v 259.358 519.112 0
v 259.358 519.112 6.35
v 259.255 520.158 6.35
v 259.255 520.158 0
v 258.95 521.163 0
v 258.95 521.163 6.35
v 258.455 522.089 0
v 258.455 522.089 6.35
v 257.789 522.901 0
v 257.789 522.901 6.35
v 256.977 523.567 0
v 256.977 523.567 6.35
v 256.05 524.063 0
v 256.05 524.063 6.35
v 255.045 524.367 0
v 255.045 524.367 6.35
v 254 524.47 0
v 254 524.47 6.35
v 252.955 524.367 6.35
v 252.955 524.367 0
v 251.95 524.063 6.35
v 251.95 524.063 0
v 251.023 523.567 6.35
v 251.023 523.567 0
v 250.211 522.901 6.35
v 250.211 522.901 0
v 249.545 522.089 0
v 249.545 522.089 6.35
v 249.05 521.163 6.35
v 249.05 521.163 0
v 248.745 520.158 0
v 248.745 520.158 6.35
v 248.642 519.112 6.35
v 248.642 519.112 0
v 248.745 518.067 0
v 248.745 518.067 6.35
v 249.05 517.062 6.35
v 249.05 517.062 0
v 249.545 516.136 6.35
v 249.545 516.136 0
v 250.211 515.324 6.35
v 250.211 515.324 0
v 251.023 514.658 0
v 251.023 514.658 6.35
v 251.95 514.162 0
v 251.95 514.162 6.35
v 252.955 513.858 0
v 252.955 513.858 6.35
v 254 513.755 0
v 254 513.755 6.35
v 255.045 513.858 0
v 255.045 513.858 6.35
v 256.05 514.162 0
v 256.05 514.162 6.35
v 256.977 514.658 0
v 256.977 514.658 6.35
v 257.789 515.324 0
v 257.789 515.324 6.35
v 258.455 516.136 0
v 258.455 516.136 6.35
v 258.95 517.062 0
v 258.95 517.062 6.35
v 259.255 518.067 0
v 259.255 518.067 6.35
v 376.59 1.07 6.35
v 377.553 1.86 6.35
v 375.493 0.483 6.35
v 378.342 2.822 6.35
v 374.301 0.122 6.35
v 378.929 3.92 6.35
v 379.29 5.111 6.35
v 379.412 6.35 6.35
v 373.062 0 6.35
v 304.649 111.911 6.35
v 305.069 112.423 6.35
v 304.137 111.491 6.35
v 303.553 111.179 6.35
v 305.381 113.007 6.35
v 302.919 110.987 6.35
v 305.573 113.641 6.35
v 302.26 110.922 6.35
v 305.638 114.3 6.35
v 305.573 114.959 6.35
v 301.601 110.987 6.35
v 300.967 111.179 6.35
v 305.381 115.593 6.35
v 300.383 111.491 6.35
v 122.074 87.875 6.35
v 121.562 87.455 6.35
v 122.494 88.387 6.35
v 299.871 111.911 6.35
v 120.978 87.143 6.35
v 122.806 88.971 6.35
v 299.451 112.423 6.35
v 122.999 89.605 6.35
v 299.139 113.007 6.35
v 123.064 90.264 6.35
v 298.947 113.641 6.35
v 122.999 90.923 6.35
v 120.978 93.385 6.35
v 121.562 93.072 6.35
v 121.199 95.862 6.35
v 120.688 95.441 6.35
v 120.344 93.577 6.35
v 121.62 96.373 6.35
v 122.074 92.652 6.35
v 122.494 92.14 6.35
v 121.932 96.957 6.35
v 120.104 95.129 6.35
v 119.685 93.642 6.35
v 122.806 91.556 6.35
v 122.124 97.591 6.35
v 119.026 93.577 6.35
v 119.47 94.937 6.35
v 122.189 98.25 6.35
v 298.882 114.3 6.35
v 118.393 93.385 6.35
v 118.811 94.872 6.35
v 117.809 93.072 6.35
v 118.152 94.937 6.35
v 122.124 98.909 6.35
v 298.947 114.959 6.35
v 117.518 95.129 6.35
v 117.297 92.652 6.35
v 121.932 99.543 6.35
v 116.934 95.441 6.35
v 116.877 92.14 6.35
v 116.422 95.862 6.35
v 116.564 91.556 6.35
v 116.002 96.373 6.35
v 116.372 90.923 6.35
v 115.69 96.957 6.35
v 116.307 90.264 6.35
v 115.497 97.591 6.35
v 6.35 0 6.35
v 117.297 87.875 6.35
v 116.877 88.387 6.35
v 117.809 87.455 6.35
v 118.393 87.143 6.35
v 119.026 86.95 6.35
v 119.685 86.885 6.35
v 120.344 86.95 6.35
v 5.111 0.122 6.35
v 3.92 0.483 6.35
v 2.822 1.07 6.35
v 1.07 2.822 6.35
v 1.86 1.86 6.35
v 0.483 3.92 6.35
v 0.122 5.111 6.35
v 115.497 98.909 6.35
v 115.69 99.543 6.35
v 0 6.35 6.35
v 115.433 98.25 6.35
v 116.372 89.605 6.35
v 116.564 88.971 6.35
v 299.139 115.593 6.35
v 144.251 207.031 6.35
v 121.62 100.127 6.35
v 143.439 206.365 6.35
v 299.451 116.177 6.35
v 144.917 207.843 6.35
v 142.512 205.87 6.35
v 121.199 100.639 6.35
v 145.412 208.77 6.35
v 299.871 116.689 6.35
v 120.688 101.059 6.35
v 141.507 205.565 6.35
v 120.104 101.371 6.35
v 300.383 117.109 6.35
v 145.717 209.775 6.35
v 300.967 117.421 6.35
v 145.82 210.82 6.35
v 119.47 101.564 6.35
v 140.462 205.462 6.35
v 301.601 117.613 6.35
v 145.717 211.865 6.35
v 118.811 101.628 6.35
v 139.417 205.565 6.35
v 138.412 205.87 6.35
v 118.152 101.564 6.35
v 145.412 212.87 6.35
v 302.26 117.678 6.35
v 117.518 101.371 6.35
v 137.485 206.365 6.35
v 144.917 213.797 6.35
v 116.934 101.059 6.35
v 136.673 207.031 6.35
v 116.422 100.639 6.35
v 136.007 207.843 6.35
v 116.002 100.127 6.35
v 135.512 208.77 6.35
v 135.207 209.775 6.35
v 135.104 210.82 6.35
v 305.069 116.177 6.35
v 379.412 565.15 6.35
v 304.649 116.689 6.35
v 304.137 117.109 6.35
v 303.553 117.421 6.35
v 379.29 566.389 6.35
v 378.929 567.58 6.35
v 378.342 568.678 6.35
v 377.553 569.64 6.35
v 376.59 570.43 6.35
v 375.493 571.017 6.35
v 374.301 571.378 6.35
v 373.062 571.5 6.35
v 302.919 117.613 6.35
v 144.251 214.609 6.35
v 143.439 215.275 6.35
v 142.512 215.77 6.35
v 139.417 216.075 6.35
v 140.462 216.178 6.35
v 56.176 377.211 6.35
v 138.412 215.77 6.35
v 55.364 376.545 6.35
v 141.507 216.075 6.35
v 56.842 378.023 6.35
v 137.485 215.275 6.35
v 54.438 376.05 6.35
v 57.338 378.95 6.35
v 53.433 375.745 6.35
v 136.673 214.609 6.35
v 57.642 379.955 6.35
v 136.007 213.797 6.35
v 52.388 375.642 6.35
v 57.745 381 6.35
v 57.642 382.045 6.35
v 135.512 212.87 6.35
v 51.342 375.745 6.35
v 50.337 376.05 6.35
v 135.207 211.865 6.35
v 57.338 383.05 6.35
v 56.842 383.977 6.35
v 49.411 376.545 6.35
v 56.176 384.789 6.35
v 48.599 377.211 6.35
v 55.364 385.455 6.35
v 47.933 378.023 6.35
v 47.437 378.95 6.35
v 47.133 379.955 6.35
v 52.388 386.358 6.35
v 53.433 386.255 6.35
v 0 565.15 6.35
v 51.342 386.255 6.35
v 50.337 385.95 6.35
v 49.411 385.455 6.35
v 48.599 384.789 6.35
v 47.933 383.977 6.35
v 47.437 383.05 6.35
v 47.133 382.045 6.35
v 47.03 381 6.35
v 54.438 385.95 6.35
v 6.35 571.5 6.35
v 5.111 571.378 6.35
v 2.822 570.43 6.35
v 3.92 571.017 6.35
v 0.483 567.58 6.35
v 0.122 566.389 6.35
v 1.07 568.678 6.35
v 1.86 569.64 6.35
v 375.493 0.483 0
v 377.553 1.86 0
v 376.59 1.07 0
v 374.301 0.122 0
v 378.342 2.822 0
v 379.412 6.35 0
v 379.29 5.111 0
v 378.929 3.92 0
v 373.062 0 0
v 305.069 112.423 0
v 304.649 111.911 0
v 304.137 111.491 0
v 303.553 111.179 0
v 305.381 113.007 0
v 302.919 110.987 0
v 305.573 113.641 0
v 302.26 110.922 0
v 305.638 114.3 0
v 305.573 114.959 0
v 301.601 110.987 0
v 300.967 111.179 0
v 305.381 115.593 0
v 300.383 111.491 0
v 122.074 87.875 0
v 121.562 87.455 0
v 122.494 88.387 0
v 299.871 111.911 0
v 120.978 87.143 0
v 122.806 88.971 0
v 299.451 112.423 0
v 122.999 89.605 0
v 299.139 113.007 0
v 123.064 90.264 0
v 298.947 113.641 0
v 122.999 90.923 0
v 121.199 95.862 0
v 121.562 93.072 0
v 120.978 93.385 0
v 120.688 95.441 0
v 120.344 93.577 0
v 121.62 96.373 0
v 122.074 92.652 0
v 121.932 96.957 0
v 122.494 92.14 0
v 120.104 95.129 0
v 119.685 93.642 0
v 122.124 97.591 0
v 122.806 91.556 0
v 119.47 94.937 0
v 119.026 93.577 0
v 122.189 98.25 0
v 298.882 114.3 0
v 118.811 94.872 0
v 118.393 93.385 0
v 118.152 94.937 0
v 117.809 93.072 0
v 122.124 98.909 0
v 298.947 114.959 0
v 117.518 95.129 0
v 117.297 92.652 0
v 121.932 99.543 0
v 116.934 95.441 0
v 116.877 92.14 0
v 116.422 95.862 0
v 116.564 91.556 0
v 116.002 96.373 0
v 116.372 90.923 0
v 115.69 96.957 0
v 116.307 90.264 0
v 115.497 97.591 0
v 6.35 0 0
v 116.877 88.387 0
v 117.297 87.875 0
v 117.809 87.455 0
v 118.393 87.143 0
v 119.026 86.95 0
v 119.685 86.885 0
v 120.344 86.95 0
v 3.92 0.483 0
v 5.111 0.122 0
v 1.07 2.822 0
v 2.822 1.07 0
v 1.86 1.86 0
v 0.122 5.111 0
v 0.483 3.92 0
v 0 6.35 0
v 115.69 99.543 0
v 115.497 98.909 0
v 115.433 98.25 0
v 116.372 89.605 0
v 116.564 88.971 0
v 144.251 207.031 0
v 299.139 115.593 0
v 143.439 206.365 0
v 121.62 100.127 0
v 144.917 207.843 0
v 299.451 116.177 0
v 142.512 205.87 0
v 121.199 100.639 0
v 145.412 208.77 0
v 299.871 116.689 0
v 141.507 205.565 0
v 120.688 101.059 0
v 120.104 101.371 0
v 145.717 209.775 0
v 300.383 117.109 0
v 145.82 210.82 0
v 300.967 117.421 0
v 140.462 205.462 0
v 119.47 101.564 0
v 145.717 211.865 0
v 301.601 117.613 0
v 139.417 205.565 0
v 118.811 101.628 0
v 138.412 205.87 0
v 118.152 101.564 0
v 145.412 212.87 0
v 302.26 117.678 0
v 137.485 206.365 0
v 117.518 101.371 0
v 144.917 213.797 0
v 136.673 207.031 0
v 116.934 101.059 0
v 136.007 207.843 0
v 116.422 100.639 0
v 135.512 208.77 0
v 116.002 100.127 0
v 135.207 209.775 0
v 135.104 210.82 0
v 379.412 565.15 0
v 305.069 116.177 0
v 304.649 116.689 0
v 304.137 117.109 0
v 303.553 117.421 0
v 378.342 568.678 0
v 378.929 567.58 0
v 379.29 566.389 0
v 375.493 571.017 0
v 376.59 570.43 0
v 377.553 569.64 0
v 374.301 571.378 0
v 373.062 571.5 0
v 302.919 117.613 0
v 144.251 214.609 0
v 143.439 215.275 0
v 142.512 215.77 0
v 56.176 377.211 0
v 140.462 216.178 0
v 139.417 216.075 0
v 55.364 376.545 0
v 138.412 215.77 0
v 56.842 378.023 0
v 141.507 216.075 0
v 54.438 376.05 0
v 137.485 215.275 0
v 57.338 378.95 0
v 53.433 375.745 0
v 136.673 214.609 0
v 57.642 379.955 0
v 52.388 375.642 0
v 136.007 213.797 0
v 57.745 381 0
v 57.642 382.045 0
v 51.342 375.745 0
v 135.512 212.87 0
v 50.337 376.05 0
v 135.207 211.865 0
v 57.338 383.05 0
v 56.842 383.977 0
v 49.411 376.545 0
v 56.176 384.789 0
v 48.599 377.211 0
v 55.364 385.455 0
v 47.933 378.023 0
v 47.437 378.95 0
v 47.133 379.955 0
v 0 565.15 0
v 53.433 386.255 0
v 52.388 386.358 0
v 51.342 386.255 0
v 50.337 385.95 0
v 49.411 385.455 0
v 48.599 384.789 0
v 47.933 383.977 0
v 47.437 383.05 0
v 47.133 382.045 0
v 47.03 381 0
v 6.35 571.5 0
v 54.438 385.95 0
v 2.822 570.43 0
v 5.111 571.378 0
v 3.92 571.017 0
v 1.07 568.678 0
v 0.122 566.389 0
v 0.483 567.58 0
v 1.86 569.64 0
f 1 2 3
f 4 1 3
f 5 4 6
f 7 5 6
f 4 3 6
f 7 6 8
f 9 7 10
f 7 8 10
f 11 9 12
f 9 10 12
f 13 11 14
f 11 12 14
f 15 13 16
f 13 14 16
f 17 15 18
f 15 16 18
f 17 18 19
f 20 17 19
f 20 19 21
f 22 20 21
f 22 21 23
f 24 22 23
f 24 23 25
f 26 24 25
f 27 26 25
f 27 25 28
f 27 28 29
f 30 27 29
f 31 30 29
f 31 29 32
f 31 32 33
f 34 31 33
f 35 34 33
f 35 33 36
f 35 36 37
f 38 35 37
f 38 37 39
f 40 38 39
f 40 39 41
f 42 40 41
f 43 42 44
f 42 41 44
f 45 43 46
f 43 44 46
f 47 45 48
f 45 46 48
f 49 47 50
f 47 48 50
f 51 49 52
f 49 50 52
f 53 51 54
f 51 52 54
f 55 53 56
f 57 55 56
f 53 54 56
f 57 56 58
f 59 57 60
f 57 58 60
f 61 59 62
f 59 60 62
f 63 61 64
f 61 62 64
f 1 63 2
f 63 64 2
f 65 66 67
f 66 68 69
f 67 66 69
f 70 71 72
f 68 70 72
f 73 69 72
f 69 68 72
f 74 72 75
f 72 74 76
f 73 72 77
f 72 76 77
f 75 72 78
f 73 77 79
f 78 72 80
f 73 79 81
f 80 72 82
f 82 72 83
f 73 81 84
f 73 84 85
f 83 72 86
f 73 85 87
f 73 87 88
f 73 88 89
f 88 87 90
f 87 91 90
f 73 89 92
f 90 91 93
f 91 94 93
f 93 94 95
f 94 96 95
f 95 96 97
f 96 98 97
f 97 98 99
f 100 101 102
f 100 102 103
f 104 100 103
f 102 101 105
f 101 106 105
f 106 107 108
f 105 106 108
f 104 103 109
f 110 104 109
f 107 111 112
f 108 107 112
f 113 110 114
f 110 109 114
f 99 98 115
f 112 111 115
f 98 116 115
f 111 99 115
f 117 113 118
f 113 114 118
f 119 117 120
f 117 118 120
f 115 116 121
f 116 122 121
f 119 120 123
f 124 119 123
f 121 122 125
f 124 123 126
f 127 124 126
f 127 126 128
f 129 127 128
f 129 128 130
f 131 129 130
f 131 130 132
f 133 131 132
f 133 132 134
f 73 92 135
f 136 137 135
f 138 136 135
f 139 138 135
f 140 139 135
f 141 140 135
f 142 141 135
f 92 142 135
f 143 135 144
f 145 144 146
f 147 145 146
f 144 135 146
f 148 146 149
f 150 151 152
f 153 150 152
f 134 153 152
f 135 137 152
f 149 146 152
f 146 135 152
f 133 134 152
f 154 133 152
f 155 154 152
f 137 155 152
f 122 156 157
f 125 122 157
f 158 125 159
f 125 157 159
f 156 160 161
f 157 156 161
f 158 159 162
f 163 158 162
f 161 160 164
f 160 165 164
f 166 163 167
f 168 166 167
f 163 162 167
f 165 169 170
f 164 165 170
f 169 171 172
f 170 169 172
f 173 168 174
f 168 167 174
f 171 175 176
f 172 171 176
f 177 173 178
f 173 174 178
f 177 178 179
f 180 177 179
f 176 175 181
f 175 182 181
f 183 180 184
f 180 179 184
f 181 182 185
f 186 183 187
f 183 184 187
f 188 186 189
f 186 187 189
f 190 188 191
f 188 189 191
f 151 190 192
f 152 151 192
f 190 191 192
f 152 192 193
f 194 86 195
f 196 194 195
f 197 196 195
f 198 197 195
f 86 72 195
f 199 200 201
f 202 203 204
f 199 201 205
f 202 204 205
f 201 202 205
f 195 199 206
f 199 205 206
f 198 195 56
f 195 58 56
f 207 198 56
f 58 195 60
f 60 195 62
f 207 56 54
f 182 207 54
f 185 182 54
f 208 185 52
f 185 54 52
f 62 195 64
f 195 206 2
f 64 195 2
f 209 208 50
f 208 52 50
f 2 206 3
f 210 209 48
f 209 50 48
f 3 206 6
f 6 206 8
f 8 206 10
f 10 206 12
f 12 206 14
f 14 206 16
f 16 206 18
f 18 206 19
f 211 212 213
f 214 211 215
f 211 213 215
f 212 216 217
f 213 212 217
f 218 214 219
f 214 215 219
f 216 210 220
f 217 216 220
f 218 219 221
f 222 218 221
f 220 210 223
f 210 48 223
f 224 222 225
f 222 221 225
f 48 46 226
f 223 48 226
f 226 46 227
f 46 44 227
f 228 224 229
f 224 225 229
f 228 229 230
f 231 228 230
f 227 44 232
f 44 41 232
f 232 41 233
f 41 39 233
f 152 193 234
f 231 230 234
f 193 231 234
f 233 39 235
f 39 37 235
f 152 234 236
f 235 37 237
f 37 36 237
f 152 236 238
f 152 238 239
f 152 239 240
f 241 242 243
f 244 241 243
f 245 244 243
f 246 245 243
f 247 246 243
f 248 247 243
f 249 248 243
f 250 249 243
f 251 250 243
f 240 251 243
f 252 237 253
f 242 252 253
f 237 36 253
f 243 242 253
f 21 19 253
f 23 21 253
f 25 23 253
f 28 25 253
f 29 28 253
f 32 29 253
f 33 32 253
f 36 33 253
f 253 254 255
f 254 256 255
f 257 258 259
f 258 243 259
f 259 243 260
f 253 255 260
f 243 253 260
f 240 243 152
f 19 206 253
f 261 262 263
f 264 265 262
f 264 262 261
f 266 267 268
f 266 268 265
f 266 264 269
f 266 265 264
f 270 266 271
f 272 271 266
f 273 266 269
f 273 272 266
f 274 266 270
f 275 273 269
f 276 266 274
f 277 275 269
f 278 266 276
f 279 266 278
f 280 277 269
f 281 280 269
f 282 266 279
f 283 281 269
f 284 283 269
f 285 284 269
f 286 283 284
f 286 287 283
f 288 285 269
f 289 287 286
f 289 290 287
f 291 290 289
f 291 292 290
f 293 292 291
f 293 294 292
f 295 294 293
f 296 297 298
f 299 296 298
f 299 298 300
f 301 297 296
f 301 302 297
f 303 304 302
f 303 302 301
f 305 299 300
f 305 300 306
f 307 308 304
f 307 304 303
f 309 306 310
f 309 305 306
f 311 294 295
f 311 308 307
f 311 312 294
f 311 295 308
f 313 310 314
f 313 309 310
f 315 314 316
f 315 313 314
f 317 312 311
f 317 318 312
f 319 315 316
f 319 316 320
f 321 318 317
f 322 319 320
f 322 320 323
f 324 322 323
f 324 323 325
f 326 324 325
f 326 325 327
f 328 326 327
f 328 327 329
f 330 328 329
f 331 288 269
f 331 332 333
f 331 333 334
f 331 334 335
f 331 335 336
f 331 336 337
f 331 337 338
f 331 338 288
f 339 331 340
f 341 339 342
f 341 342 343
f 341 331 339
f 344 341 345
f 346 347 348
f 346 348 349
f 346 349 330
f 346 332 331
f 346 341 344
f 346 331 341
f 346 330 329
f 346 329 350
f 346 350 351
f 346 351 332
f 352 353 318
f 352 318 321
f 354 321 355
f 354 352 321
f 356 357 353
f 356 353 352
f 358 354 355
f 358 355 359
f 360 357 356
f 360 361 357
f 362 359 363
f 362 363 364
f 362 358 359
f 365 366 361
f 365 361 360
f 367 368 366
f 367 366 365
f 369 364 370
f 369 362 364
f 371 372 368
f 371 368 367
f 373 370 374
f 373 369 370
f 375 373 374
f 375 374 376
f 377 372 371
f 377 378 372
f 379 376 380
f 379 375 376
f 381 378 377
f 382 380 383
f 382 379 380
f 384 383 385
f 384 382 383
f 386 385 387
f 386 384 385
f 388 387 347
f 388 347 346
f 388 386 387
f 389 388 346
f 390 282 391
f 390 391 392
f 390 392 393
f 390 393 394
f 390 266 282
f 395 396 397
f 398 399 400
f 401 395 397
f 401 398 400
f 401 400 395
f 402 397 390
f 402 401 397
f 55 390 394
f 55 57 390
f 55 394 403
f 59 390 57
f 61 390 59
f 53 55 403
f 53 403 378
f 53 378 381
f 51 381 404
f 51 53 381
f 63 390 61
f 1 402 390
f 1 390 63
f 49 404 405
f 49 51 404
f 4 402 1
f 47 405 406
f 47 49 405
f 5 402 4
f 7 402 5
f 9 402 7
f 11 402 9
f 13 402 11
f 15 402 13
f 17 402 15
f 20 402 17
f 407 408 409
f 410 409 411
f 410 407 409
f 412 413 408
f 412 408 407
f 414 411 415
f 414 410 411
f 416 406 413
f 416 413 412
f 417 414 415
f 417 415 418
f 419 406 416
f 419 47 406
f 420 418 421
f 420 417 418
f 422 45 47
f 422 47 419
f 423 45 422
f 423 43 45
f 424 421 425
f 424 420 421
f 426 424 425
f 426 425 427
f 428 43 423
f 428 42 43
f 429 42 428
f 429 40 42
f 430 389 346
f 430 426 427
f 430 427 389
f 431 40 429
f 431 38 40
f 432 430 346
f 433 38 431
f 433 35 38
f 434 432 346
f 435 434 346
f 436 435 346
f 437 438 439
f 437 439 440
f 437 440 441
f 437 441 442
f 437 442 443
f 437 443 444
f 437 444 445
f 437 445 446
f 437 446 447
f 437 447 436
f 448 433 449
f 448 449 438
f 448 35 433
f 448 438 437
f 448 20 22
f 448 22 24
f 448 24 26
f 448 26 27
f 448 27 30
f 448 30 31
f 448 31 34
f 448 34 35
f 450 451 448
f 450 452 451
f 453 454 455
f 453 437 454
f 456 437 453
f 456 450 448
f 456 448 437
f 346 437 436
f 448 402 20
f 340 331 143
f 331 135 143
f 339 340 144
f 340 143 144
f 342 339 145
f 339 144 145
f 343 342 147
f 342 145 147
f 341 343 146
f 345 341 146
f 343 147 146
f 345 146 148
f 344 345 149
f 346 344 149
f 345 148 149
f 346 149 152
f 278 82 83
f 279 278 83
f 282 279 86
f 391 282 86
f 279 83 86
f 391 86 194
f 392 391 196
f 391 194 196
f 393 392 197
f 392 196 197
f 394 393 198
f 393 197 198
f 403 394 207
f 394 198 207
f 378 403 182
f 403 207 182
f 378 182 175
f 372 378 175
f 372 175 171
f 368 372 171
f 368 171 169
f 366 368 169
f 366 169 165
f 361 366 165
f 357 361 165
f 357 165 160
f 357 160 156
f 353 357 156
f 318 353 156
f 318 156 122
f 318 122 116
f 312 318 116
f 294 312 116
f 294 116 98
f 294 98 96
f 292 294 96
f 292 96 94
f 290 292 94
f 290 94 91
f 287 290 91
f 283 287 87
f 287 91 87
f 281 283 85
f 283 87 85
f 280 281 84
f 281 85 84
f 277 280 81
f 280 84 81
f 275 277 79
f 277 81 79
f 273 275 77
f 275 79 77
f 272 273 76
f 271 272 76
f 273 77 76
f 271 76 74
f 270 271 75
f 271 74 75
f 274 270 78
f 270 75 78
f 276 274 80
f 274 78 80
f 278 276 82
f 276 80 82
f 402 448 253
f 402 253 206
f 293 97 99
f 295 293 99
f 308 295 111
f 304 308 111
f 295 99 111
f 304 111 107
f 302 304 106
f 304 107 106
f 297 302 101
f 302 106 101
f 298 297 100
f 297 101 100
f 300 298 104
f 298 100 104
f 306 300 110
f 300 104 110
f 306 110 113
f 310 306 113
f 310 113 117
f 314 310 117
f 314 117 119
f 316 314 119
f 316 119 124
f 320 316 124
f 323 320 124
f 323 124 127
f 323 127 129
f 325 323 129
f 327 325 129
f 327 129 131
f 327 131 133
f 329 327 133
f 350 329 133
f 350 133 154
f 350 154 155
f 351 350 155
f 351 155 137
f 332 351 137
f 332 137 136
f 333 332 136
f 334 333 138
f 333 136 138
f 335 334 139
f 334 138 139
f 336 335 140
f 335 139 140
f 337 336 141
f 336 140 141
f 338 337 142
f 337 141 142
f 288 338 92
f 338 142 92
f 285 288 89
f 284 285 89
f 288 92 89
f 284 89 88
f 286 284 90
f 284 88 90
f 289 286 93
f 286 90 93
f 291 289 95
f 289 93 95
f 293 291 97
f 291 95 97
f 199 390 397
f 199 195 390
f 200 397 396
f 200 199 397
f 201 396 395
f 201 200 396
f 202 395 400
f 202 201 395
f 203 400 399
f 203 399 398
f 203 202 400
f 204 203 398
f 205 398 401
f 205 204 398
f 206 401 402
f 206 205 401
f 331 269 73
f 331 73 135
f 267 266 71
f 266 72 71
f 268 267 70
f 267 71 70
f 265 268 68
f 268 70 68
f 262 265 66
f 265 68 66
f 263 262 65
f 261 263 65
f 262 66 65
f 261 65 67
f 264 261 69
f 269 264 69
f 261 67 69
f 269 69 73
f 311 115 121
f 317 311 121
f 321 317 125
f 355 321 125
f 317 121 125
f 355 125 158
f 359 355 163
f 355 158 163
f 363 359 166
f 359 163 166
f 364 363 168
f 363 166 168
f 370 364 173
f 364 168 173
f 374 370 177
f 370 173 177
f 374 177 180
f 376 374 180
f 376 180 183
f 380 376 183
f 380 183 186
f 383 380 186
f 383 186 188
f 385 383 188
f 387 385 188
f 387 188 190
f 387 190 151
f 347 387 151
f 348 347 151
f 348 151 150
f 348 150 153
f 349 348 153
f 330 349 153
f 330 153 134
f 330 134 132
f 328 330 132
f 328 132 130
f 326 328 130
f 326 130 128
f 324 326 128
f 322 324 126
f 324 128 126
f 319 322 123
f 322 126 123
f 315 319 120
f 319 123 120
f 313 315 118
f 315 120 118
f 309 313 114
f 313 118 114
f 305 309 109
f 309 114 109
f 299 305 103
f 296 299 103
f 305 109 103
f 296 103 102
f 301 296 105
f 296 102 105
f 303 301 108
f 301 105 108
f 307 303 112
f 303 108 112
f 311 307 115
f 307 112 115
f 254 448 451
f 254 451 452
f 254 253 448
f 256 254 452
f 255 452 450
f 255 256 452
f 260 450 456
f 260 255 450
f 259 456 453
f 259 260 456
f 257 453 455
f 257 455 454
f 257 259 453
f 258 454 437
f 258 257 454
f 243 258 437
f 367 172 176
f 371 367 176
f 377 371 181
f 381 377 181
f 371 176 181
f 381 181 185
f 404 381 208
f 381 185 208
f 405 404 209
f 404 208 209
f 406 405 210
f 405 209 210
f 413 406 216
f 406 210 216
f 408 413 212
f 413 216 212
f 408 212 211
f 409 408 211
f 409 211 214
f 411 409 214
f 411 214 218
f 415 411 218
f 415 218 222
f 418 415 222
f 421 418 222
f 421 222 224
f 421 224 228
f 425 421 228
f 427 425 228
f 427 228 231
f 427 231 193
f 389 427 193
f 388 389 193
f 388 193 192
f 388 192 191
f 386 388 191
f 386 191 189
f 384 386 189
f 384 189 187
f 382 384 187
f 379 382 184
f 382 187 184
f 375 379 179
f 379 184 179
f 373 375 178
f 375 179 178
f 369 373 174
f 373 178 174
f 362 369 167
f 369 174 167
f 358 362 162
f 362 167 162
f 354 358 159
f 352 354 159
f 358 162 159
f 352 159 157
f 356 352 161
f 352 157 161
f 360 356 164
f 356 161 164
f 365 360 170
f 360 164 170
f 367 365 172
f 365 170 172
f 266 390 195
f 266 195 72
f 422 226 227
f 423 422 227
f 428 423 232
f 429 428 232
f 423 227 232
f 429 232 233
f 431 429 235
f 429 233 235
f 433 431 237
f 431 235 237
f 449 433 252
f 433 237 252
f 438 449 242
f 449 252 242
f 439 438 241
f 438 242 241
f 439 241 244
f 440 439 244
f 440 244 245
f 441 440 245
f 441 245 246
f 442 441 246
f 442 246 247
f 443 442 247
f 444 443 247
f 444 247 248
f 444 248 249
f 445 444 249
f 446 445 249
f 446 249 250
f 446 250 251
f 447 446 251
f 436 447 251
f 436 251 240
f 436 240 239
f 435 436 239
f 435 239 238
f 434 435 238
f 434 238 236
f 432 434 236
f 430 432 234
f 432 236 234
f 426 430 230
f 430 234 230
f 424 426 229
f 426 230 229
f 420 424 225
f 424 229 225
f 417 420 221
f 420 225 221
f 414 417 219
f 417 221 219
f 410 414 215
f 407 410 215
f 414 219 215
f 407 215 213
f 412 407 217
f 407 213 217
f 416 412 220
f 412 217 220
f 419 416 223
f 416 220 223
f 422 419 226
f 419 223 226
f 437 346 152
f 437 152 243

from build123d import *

# Parameters (mm, degrees)
BOSS_EXTRUDE1_DEPTH              = 6.35
FILLET1_R                        = 3.175
FILLET2_R                        = 44.45
F_1_4_CLEARANCE_HOLE1_D          = 6.7564
SKETCH4_W                        = 100.0125
SKETCH4_H                        = 155.575
CUT_EXTRUDE1_DEPTH               = 746.989881382
F_27_64_0_42188_DIAMETER_HOLE1_D = 10.715752
FILLET3_R                        = 6.35


with BuildPart() as part:
    # Sketch1 → Boss-Extrude1 (new body)
    with BuildSketch(Plane.XY):
        Polygon((0, 0), (0, 571.5), (379.4125, 571.5), (379.4125, 466.725), (479.425, 466.725), (479.425, 355.6), (428.625, 355.6), (428.625, 403.225), (379.4125, 403.225), (379.4125, 0), align=None)
    extrude(amount=BOSS_EXTRUDE1_DEPTH)

    # Fillet1
    fillet1_edges = [part.edges().sort_by_distance(p)[0] for p in [
        (428.625, 403.225, 3.175),
        (379.4125, 403.225, 3.175),
    ]]
    fillet(fillet1_edges, radius=FILLET1_R)

    # Fillet2
    fillet2_edges = [part.edges().sort_by_distance(p)[0] for p in [
        (379.4125, 466.725, 3.175),
        (479.425, 466.725, 3.175),
    ]]
    fillet(fillet2_edges, radius=FILLET2_R)

    # 1/4 Clearance Hole1 (through all)
    with Locations(Plane(origin=(0, 0, 0), x_dir=(-1, 0, 0), z_dir=(0, 0, -1))):
        with Locations((-118.810746346, 98.250269973), (-302.26, 114.3), (-119.685428778, 90.263601703)):
            Hole(F_1_4_CLEARANCE_HOLE1_D / 2)

    # Sketch4 → Cut-Extrude1 (cut, through all)
    with BuildSketch(Plane(origin=(0, 0, 0), x_dir=(-1, 0, 0), z_dir=(0, 0, -1))):
        with Locations((-429.41875, 433.3875)):
            Rectangle(SKETCH4_W, SKETCH4_H)
    extrude(amount=-CUT_EXTRUDE1_DEPTH, mode=Mode.SUBTRACT)

    # 27/64 (0.42188) Diameter Hole1 (through all)
    with Locations(Plane(origin=(0, 0, 0), x_dir=(-1, 0, 0), z_dir=(0, 0, -1))):
        with Locations((-254, 519.1125), (-52.3875, 381), (-140.462, 210.82)):
            Hole(F_27_64_0_42188_DIAMETER_HOLE1_D / 2)

    # Fillet3
    fillet3_edges = [part.edges().sort_by_distance(p)[0] for p in [
        (0, 0, 3.175),
        (0, 571.5, 3.175),
        (379.4125, 571.5, 3.175),
        (379.4125, 0, 3.175),
    ]]
    fillet(fillet3_edges, radius=FILLET3_R)


solid = part.part
